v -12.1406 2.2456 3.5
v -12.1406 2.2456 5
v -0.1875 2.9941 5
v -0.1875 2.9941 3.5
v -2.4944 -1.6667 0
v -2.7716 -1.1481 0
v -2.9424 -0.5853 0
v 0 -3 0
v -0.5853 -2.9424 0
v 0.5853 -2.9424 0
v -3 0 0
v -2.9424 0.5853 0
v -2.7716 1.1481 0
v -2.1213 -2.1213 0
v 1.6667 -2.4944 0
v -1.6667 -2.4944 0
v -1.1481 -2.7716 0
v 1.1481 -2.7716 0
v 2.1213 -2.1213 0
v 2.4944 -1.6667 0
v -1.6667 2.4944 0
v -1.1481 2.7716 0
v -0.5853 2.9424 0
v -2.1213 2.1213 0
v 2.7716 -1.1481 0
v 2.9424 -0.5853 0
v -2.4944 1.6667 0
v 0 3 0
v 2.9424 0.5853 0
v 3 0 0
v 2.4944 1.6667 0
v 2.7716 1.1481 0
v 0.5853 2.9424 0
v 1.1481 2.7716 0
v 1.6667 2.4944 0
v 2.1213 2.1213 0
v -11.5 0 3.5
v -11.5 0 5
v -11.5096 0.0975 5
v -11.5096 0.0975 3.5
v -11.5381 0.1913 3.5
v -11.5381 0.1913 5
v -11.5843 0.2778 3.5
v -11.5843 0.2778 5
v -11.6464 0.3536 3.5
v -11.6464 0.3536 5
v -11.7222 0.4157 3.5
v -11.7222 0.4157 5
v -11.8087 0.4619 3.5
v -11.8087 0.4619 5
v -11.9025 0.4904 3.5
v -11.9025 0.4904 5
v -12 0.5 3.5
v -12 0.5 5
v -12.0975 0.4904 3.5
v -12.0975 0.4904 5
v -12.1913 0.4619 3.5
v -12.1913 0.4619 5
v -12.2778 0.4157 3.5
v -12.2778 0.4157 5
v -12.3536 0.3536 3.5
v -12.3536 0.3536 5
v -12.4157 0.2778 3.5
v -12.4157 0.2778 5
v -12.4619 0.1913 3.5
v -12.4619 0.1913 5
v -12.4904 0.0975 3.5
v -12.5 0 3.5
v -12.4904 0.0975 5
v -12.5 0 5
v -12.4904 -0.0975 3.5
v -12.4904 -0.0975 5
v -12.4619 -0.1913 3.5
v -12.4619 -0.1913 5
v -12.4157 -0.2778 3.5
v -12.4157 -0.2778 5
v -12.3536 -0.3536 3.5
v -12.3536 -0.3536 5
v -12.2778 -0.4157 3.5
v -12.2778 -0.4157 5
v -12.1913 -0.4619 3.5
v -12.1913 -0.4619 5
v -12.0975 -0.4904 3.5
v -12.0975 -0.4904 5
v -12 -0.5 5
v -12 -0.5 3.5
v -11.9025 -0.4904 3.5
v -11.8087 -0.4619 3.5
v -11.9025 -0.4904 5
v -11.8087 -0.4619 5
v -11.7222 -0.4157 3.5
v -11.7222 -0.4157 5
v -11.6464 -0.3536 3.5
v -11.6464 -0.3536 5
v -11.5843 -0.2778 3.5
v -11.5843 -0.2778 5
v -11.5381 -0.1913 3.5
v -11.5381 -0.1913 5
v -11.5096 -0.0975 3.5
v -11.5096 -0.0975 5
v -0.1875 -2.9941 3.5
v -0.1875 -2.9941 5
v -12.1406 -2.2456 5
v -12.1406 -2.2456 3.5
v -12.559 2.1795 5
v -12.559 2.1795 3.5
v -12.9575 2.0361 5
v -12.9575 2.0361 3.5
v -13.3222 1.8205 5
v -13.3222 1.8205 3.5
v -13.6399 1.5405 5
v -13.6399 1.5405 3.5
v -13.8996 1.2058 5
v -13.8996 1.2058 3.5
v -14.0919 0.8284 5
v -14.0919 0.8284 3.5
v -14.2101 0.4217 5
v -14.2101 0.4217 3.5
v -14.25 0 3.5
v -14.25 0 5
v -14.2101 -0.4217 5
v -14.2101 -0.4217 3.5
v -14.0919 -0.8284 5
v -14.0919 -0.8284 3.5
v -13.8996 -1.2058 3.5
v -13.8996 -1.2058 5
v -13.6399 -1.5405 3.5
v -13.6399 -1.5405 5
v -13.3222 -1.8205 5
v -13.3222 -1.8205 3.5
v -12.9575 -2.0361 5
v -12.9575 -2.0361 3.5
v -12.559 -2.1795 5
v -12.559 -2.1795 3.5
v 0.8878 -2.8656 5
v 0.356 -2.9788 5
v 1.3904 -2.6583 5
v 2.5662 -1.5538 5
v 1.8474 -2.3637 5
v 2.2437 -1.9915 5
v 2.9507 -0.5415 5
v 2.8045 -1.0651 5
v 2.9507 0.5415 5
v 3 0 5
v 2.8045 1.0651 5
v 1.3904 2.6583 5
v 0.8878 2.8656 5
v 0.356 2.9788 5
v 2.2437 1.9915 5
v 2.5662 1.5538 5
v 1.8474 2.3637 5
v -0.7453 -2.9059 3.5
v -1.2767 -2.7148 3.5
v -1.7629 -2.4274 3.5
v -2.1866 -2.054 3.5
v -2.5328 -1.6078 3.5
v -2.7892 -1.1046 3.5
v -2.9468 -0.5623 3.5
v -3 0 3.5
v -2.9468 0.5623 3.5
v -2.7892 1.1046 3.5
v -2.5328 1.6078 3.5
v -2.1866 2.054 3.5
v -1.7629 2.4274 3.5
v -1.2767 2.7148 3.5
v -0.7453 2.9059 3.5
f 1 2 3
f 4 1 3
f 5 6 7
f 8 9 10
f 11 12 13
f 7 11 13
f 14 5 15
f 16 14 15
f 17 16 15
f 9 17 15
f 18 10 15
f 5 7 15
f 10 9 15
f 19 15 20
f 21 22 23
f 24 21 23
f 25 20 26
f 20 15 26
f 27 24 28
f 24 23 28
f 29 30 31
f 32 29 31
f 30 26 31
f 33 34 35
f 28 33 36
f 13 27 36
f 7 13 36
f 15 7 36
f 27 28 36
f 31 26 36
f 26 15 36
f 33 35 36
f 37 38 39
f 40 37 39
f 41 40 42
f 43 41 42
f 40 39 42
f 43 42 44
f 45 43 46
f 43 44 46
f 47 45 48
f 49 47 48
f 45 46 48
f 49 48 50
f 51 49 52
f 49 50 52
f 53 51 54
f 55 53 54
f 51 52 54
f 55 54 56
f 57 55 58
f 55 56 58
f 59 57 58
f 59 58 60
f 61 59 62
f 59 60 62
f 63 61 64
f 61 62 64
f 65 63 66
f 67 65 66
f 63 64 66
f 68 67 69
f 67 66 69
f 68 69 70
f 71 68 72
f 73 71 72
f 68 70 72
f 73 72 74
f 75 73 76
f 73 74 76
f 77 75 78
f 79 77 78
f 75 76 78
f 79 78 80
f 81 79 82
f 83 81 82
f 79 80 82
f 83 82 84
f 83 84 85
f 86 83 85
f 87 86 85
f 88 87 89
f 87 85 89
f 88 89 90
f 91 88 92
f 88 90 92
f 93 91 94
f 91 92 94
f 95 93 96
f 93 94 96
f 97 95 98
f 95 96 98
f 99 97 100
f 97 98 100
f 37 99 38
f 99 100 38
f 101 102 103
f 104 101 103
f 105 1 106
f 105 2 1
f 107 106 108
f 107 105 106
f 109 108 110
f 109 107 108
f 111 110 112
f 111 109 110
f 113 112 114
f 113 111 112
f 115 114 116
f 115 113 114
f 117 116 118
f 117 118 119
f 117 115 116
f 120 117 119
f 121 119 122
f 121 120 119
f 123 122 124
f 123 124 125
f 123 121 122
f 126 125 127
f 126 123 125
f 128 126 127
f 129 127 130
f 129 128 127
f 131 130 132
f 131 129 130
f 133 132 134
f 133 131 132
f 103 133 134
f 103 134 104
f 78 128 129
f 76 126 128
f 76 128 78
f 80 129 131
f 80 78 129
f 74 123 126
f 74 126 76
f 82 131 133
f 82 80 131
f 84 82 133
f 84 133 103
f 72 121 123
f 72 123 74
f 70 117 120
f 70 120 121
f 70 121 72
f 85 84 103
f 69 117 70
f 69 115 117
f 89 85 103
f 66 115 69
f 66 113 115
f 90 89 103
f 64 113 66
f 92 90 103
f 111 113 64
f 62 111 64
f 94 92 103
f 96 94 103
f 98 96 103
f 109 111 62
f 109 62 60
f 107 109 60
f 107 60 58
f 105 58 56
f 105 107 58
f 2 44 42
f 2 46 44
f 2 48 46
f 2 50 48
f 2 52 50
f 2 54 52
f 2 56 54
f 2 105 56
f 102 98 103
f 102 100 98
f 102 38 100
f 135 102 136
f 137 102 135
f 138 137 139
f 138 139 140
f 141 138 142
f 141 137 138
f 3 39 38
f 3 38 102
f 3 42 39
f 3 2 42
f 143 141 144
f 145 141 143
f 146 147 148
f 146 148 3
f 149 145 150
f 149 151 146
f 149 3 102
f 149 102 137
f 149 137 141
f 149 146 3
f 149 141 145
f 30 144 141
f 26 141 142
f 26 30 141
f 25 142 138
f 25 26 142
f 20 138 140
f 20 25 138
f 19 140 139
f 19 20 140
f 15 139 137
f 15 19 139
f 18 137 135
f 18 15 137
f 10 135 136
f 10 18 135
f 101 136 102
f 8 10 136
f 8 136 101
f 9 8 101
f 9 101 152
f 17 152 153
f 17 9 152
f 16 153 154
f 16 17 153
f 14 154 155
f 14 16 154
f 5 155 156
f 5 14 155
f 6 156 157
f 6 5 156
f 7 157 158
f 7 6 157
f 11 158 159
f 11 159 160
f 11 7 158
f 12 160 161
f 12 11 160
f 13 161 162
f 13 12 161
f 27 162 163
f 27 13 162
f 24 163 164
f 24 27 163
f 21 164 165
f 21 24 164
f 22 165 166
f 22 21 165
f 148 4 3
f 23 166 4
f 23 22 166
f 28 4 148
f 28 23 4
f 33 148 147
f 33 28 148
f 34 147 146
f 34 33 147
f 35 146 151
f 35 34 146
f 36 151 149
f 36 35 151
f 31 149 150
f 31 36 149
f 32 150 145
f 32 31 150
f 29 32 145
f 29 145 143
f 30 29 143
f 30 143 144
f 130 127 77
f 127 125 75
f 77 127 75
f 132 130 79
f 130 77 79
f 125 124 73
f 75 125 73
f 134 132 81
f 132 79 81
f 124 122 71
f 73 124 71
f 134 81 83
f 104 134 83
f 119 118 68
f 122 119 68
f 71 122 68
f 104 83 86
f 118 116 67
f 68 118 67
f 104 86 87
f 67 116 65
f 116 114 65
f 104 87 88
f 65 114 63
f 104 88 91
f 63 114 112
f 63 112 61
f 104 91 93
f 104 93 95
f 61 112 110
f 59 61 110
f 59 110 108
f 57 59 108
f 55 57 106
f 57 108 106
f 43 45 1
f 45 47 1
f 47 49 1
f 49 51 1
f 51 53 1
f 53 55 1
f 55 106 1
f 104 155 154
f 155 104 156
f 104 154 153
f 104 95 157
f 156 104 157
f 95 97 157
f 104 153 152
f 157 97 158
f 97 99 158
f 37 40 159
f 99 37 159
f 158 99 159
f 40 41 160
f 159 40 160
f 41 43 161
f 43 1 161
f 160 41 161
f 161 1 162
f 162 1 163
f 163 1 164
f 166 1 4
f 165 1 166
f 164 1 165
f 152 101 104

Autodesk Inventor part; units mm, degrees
ref_plane "YZ Plane" through (0, 0, 0) normal (1, 0, 0) x (0, 1, 0)
ref_plane "XZ Plane" through (0, 0, 0) normal (0, 1, 0) x (-1, 0, 0)
ref_plane "XY Plane" through (0, 0, 0) normal (0, 0, 1) x (1, 0, 0)
sketch "Sketch1" plane through (0, 0, 0) normal (0, 0, 1) x (1, 0, 0)
  circle A0 centre (0, 0) radius 3
  dimension "d0" = 6
extrude "Extrusion1" add sketch "Sketch1" along normal blind 5
sketch "Sketch2" plane through (0, 0, 5) normal (0, 0, 1) x (1, 0, 0)
  circle A0 centre (0, 0) radius 3 projected
  line L0 (0, 0) -> (-12, 0)
  circle A1 centre (-12, 0) radius 0.5
  circle A2 centre (-12, 0) radius 2.25
  line L1 (-0.1875, -2.9941) -> (-12.1406, -2.2456)
  line L2 (-12.1406, 2.2456) -> (-0.1875, 2.9941)
  circle A3 centre (0, 0) radius 3 projected
  dimension "d3" = 12
  dimension "d4" = 1
  dimension "d5" = 4.5
extrude "Extrusion2" add sketch "Sketch2" against normal blind 1.5 contours A0 L0 A2 L2 | L1 A2 L0 A0 | A2
properties part number "ServoArm"
